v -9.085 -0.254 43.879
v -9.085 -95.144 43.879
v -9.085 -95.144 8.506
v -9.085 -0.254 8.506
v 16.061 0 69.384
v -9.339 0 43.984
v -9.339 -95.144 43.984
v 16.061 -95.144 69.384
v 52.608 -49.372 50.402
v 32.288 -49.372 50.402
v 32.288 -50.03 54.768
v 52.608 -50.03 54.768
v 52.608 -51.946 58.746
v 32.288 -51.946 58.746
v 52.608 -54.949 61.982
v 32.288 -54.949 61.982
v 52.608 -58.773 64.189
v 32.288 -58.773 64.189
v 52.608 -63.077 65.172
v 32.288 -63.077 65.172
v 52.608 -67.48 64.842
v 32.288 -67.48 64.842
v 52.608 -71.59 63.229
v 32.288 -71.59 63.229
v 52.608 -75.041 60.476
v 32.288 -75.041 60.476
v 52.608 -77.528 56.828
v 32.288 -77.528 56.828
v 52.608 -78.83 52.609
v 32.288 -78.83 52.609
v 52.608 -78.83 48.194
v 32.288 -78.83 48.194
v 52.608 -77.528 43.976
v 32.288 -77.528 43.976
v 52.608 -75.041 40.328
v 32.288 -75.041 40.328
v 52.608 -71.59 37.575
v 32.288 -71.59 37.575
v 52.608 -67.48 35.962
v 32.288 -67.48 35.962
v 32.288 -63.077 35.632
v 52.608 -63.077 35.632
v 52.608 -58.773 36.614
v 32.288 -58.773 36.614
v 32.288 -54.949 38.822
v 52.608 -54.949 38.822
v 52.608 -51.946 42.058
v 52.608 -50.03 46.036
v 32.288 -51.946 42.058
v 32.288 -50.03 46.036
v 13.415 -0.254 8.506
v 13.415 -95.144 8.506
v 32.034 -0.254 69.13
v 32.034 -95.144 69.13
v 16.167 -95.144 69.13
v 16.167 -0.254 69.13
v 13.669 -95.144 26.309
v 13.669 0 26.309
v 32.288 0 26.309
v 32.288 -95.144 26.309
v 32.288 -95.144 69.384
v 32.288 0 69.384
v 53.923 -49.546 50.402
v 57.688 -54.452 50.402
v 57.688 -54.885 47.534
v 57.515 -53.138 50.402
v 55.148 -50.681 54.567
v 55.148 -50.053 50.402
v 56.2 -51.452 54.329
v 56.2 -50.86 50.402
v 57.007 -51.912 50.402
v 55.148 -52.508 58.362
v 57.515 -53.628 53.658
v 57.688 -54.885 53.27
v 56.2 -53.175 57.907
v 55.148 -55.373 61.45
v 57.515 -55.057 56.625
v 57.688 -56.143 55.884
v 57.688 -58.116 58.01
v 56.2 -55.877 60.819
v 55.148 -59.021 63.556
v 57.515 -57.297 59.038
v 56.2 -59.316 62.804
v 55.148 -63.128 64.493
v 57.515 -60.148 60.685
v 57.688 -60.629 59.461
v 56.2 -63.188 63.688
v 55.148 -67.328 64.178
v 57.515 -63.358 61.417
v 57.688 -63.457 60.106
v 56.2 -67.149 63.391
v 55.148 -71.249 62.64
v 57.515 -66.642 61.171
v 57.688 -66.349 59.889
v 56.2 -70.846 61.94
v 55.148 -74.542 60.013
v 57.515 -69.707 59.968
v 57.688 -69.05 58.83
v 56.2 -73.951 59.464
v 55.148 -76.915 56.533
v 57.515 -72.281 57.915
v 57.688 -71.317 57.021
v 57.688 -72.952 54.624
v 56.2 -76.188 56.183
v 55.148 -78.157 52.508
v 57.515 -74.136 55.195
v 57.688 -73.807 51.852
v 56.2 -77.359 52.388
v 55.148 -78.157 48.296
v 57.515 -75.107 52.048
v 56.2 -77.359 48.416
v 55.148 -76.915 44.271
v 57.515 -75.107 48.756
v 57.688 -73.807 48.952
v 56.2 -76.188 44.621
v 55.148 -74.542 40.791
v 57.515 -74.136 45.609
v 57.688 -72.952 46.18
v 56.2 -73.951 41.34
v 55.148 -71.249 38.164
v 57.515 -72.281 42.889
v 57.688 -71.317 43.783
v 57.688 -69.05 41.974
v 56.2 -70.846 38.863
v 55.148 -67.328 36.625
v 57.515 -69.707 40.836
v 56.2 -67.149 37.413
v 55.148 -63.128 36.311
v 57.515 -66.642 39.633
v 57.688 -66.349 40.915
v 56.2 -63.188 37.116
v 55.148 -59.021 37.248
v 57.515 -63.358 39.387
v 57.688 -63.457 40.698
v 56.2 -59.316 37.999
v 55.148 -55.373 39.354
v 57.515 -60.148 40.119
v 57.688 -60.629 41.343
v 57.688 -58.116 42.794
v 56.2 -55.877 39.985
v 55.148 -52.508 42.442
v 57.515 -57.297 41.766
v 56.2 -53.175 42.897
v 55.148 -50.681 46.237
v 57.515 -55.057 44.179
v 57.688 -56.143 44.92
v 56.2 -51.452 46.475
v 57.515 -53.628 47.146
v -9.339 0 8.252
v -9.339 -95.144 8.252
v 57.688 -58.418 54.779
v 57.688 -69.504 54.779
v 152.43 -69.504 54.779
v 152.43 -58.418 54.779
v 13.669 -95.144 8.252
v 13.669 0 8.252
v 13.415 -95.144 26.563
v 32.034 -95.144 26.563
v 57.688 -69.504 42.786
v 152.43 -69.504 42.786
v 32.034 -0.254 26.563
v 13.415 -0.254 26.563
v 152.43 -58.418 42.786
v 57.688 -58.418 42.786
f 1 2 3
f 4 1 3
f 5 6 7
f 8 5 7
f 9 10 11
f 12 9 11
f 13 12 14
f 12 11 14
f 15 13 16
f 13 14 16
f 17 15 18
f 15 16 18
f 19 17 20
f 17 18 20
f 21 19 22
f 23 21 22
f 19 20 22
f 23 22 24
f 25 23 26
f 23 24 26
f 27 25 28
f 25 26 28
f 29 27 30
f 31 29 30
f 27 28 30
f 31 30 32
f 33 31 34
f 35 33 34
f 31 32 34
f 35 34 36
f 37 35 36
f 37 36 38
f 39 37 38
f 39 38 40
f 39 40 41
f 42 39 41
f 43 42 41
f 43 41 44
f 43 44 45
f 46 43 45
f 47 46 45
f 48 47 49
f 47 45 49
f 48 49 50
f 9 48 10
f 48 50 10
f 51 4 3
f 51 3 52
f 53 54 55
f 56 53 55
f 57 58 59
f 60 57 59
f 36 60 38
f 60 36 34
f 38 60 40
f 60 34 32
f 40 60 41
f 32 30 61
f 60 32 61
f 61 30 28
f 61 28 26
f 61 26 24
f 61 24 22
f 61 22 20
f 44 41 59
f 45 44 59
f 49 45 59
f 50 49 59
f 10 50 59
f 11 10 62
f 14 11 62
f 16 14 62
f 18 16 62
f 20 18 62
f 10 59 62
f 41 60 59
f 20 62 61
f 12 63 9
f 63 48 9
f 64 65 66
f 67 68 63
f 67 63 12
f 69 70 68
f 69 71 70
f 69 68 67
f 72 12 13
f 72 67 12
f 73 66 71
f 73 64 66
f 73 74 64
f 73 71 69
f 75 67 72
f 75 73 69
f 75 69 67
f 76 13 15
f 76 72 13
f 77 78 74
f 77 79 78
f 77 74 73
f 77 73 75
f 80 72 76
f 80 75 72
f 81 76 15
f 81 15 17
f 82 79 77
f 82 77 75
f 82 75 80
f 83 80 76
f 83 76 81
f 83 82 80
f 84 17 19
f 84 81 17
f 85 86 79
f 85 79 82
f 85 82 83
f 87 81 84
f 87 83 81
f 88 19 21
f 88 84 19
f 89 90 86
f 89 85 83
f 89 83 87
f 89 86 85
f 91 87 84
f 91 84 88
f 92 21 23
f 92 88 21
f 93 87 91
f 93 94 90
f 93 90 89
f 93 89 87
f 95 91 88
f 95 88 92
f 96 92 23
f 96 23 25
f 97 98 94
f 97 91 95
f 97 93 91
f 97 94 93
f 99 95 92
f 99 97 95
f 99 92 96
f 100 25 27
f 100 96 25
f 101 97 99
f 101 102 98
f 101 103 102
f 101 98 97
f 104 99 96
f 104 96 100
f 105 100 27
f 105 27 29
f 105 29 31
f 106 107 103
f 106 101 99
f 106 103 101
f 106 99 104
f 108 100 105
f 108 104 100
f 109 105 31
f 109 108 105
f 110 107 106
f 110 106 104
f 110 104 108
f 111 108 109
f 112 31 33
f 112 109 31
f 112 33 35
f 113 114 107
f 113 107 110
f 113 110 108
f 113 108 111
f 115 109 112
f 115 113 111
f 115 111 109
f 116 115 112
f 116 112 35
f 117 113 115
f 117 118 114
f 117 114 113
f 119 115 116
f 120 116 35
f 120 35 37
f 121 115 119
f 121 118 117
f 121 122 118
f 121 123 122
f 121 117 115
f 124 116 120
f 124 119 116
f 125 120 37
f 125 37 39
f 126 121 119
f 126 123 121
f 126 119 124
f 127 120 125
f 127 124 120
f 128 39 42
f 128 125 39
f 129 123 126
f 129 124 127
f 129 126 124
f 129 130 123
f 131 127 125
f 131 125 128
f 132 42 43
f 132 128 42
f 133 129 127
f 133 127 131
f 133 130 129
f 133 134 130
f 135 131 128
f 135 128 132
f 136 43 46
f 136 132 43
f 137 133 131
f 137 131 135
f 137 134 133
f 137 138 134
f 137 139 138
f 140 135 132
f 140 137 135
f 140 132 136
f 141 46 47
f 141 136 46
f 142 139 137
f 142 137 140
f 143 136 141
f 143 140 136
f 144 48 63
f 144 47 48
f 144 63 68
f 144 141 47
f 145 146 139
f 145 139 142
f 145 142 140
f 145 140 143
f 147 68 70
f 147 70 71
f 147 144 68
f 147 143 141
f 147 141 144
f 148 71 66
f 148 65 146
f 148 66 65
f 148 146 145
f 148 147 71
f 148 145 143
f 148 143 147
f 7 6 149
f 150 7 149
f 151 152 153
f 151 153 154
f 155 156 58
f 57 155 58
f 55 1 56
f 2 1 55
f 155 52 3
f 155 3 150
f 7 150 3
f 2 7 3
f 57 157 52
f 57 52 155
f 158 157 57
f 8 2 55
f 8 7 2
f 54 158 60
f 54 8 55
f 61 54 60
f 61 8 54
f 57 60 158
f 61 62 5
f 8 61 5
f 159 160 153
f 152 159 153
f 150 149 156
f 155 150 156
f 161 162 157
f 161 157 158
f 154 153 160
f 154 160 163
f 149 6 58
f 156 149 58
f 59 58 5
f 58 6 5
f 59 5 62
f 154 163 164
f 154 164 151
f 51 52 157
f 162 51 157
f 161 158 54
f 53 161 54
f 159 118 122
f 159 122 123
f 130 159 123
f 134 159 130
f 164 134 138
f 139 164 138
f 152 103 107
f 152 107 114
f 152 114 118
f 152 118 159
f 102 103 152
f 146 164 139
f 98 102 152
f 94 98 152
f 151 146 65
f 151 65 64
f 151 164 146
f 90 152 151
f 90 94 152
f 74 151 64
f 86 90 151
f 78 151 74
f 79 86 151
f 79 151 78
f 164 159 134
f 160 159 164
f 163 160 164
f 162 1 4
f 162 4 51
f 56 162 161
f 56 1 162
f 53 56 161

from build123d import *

# Parameters (mm, degrees)
F1_DEPTH  = 95.1442476362
F4_SIZE   = 25.4
F5_T      = -0.254
F7_R      = 14.8113832011
F8_DEPTH  = 25.4
F9_W      = 11.0863484442
F9_H      = 11.992841959
F10_DEPTH = 94.742
F11_R     = 5.08


# Not quite as in the source:
# - the program builds the solid bodies; features that only make, move or delete a surface that nothing else refers to are left out


with BuildPart() as f1:
    # F0 (on Front) → F1 (new body)
    with BuildSketch(Plane.XZ):
        Polygon((-9.3385055661, 8.2524567842), (13.6685147882, 8.2524567842), (13.6685147882, 26.3094156981), (32.2877131402, 26.3094156981), (32.2877131402, 69.3843364716), (-9.3385055661, 69.3843364716), align=None)
    extrude(amount=F1_DEPTH)

    # F4
    f4_edges = [f1.edges().sort_by_distance(p)[0] for p in [
        (-9.338506, -47.572124, 69.384336),
    ]]
    chamfer(f4_edges, length=F4_SIZE)

    # F5
    f5_openings = [f1.faces().sort_by_distance(p)[0] for p in [
        (11.53567, -95.144248, 38.877913),
    ]]
    offset(amount=F5_T, openings=f5_openings, kind=Kind.INTERSECTION)

    # F7 (on face) → F8 (join)
    with BuildSketch(Plane.YZ.offset(32.2877131402)):
        with Locations((-64.1838386655, 50.4019707441)):
            Circle(F7_R)
    extrude(amount=F8_DEPTH)

    # F9 (on face) → F10 (join)
    with BuildSketch(Plane.YZ.offset(57.6877131402)):
        with Locations((-63.960975036, 48.7824268639)):
            Rectangle(F9_W, F9_H)
    extrude(amount=F10_DEPTH)

    # F11
    f11_edges = [f1.edges().sort_by_distance(p)[0] for p in [
        (57.687713, -78.995222, 50.401971),
    ]]
    fillet(f11_edges, radius=F11_R)


solid = f1.part
